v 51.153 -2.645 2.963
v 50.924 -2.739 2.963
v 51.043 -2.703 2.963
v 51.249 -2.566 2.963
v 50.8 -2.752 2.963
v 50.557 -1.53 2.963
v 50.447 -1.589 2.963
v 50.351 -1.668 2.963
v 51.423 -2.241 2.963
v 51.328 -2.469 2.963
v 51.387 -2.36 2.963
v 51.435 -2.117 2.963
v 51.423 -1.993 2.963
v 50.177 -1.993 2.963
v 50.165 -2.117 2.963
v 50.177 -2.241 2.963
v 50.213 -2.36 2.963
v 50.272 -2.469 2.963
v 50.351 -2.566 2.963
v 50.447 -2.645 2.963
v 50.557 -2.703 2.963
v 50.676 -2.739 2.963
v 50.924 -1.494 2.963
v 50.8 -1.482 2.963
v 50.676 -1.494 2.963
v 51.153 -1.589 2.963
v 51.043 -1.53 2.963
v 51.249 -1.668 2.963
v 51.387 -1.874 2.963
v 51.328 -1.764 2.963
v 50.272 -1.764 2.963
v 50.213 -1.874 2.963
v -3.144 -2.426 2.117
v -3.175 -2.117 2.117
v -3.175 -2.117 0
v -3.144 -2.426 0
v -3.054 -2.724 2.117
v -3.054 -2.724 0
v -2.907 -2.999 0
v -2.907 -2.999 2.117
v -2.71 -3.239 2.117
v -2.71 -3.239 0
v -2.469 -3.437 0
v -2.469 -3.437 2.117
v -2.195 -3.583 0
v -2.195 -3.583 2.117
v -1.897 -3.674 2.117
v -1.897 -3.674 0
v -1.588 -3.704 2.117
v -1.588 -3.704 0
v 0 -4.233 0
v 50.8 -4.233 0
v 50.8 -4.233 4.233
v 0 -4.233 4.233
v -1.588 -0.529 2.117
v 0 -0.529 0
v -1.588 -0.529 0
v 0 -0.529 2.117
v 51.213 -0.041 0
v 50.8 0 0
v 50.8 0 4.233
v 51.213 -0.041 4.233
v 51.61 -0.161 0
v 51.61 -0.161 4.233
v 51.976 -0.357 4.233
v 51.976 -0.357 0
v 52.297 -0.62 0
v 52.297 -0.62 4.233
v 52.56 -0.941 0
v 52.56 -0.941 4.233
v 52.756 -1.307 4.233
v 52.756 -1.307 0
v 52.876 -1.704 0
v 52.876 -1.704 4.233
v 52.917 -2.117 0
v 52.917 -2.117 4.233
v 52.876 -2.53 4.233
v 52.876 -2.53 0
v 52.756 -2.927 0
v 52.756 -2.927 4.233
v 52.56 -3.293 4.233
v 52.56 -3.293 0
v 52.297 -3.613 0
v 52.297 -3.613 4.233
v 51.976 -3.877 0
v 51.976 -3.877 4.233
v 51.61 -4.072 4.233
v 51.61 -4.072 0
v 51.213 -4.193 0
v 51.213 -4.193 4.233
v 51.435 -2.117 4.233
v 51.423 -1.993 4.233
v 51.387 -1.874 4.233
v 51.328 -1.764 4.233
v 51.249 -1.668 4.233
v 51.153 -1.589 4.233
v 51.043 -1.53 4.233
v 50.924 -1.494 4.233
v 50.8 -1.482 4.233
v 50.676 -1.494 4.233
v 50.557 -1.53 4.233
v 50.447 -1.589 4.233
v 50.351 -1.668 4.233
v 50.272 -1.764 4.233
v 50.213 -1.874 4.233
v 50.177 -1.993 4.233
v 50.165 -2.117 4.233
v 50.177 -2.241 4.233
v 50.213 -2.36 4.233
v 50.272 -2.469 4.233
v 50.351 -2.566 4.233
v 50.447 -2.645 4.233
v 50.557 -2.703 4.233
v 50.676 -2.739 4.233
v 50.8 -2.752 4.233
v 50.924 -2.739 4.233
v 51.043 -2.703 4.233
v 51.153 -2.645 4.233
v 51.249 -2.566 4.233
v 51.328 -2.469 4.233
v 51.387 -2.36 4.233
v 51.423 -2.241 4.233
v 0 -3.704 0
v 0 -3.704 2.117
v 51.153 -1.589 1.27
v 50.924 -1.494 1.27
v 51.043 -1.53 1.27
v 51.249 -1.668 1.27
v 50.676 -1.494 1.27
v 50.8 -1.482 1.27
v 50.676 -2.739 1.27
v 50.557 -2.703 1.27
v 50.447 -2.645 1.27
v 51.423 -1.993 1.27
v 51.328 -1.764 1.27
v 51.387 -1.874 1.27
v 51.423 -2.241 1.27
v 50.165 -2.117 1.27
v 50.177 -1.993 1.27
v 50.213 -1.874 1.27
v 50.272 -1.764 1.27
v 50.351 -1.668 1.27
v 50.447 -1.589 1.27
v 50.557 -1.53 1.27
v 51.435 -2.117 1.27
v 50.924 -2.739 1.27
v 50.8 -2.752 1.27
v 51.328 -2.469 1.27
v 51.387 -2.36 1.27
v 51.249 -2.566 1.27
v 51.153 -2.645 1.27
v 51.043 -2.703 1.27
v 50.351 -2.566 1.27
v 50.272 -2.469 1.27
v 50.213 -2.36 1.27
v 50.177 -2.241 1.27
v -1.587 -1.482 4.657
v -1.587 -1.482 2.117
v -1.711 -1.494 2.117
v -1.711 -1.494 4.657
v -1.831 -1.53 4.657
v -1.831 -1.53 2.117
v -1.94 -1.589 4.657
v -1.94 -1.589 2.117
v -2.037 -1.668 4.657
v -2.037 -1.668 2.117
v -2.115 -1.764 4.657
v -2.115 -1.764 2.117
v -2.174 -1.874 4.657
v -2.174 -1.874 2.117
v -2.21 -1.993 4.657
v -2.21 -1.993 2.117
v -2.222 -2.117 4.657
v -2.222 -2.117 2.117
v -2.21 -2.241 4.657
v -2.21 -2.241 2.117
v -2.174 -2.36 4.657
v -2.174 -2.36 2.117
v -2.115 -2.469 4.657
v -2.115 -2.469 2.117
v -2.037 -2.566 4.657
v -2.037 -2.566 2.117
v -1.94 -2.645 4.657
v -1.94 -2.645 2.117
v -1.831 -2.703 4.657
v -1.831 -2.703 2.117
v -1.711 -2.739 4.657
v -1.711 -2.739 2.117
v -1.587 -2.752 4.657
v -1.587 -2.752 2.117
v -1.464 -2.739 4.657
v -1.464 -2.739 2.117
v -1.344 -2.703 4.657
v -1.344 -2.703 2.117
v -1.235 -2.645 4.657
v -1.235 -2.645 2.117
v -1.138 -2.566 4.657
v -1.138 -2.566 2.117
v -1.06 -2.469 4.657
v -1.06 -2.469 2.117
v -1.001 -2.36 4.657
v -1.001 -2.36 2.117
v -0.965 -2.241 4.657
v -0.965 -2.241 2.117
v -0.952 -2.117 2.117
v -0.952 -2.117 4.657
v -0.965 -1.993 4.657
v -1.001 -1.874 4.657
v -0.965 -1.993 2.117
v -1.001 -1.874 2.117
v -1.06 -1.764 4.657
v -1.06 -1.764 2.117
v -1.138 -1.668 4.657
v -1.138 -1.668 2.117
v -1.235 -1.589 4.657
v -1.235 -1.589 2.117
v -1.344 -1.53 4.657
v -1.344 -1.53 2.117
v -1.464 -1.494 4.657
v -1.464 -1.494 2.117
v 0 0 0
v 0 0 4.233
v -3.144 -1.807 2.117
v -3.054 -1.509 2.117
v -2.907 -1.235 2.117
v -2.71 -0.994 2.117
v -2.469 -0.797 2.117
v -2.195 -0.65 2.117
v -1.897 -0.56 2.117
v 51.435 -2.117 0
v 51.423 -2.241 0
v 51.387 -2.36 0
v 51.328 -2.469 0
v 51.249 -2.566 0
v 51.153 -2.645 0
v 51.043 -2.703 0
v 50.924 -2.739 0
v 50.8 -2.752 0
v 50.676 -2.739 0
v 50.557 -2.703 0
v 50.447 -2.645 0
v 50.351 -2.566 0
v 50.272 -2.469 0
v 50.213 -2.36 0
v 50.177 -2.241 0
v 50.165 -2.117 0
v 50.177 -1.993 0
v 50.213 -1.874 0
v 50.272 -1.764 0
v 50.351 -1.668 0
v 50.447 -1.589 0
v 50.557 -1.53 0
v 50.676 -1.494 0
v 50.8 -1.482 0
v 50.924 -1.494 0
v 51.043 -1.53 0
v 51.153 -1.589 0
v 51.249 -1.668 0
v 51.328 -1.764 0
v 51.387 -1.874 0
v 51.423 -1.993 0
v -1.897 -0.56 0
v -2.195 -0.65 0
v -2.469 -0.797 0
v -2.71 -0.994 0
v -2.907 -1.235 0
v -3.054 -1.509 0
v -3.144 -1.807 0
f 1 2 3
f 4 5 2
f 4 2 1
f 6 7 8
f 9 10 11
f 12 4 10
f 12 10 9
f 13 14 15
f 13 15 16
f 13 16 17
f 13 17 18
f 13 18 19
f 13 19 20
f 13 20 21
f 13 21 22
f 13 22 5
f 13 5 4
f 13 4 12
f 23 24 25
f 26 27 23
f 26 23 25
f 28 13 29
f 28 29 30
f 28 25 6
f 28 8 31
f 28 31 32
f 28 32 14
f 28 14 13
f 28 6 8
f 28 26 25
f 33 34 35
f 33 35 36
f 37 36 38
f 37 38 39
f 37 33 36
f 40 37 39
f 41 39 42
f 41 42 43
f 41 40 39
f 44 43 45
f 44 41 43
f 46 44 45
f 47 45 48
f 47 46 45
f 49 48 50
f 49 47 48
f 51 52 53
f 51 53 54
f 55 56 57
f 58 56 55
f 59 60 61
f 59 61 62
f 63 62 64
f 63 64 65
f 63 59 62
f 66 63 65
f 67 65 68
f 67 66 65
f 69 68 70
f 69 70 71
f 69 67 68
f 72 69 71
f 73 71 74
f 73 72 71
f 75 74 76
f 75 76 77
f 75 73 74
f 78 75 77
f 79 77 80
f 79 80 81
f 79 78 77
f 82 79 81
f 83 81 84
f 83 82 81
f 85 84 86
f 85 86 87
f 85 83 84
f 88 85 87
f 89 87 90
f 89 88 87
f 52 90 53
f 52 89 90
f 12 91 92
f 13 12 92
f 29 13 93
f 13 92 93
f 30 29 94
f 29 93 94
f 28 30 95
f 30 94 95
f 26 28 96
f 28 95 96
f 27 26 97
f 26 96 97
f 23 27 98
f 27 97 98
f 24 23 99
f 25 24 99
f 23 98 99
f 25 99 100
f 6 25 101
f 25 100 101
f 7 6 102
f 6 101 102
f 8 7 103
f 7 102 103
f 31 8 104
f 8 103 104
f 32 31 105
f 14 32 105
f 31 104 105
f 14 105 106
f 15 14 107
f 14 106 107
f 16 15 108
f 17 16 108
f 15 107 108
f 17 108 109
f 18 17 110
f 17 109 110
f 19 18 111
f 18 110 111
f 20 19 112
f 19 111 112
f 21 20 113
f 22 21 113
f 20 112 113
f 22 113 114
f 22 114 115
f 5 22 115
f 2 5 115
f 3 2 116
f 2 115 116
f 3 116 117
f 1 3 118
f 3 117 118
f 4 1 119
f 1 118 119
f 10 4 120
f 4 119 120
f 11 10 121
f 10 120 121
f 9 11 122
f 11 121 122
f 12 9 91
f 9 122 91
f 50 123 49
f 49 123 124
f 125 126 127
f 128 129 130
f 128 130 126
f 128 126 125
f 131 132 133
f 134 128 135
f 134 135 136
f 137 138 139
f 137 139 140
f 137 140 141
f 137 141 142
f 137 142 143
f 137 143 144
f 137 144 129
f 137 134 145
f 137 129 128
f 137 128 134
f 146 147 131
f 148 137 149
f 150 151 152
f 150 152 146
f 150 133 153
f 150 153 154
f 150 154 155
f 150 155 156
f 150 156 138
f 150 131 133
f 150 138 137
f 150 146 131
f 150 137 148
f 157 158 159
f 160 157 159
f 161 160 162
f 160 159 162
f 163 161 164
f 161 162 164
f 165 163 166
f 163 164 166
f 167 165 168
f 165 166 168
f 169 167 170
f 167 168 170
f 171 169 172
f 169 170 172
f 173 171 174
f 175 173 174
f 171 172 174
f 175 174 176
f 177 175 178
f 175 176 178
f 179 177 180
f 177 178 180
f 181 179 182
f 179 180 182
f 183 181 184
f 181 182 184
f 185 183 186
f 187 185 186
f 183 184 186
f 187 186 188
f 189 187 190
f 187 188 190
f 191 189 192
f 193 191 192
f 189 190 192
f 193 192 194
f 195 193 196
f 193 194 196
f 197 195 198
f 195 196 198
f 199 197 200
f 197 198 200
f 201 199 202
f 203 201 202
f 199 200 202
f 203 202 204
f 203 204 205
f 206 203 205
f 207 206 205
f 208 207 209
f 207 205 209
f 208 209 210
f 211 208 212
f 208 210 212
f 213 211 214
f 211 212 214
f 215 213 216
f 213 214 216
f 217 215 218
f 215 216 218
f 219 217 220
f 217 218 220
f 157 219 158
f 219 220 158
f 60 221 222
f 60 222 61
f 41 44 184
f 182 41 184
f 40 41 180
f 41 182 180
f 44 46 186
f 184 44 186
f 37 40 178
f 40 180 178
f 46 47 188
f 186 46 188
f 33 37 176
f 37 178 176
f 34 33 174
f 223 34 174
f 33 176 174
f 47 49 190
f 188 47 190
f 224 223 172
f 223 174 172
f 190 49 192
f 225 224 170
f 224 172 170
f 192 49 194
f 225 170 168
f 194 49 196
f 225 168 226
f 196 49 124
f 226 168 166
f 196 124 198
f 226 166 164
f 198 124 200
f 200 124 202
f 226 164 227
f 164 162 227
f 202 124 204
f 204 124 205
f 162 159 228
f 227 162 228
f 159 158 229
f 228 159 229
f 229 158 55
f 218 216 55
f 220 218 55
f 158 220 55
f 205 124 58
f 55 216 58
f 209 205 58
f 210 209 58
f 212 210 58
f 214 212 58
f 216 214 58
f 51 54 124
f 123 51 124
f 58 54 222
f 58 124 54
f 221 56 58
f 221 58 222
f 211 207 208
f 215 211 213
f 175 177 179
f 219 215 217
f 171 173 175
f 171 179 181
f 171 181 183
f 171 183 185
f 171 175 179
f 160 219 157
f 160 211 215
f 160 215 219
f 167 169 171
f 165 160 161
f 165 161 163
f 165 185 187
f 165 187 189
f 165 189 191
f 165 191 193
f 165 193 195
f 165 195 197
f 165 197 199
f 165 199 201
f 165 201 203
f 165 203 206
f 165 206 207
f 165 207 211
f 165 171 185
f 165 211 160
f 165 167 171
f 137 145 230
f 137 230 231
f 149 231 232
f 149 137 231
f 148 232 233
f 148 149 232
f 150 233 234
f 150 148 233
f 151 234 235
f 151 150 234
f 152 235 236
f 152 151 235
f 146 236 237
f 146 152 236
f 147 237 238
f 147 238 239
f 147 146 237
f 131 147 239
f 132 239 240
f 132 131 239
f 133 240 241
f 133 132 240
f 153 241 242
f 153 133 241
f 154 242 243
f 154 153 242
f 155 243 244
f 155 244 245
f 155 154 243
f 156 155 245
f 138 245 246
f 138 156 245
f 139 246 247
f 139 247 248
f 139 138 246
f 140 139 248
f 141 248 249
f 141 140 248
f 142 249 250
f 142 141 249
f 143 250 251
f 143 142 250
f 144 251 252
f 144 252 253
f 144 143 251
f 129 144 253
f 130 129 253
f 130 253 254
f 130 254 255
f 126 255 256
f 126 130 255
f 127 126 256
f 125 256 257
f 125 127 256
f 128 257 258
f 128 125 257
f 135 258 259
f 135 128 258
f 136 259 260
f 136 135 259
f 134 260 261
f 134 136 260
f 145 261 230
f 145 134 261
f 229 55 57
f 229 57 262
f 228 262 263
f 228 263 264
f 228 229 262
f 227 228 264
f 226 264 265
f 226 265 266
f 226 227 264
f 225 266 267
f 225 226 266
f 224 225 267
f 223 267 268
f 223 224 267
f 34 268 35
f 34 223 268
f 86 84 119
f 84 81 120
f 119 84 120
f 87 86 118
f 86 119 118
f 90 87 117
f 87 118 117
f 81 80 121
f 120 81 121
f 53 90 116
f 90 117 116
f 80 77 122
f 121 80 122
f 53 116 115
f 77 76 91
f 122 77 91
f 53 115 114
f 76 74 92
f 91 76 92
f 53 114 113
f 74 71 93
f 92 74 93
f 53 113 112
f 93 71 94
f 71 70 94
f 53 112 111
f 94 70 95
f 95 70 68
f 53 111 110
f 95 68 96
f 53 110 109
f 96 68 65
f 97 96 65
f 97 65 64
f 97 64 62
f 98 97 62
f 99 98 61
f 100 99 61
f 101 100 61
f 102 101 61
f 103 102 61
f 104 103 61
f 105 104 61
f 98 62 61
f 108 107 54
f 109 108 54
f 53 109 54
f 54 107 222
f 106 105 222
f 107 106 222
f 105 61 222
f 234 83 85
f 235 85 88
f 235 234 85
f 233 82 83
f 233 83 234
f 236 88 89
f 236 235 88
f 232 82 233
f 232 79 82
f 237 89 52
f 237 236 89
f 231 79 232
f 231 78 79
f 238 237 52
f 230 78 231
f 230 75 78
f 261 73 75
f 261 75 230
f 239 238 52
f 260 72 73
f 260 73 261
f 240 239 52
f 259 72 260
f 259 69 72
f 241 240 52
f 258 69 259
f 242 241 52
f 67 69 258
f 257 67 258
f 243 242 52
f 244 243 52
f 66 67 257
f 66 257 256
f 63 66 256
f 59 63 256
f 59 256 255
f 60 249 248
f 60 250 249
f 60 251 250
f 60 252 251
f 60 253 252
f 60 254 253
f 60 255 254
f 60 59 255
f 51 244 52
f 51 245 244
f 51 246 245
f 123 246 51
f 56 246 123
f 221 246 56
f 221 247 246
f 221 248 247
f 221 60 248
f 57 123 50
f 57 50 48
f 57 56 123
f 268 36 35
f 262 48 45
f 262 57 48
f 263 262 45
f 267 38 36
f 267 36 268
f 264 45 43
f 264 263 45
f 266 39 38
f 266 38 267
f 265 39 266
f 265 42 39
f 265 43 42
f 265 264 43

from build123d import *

# Parameters (mm, degrees)
BOSS_EXTRUDE3_DEPTH = 4.233333333
SKETCH4_W           = 2.116666667
SKETCH4_H           = 3.175
BOSS_EXTRUDE5_DEPTH = 3.175
CUT_EXTRUDE1_START  = -2.116666667
CUT_EXTRUDE1_DEPTH  = 2.116666667
SKETCH6_R           = 0.635
BOSS_EXTRUDE6_DEPTH = 2.54
SKETCH7_R           = 0.635
CUT_EXTRUDE2_DEPTH  = 1.27
CUT_EXTRUDE3_START  = -1.27
SKETCH8_R           = 0.635
CUT_EXTRUDE3_DEPTH  = 1.27


# Read off the part's stored shape, not the designer's step: Cut-Extrude1
with BuildPart() as part:
    # Sketch3 → Boss-Extrude3 (new body)
    with BuildSketch(Plane.XY):
        with BuildLine():
            Line((0, 0), (50.8, 0))
            ThreePointArc((50.8, 0), (52.916666667, -2.116666667), (50.8, -4.233333333))
            Line((50.8, -4.233333333), (0, -4.233333333))
            Line((0, -4.233333333), (0, 0))
        make_face()
    extrude(amount=BOSS_EXTRUDE3_DEPTH)

    # Sketch4 → Boss-Extrude5 (add)
    with BuildSketch(Plane.ZY):
        with Locations((1.058333334, -2.116666667)):
            Rectangle(SKETCH4_W, SKETCH4_H)
    extrude(amount=BOSS_EXTRUDE5_DEPTH)

    # Cut-Extrude1 outline → Cut-Extrude1 (cut)
    with BuildSketch(Plane(origin=(0, 0, 0), x_dir=(-1, 0, 0), z_dir=(0, 0, -1)).offset(CUT_EXTRUDE1_START)):
        with BuildLine():
            Line((3.175, -0.529166667), (1.5875, -0.529166667))
            ThreePointArc((1.5875, -0.529166667), (2.710032015, -0.994134652), (3.175, -2.116666667))
            Line((3.175, -2.116666667), (3.175, -0.529166667))
        make_face()
        with BuildLine():
            Line((3.175, -3.704166667), (3.175, -2.116666667))
            ThreePointArc((3.175, -2.116666667), (2.710032015, -3.239198682), (1.5875, -3.704166667))
            Line((1.5875, -3.704166667), (3.175, -3.704166667))
        make_face()
    extrude(amount=CUT_EXTRUDE1_DEPTH, mode=Mode.SUBTRACT)

    # Sketch6 → Boss-Extrude6 (add)
    with BuildSketch(Plane.XY.offset(2.116666667)):
        with Locations(Location((-1.5875, -2.116666667, 0), (0, 0, 90))):
            Circle(SKETCH6_R)
    extrude(amount=BOSS_EXTRUDE6_DEPTH)

    # Sketch7 → Cut-Extrude2 (cut)
    with BuildSketch(Plane.XY.offset(4.233333333)):
        with Locations((50.8, -2.116666667)):
            Circle(SKETCH7_R)
    extrude(amount=-CUT_EXTRUDE2_DEPTH, mode=Mode.SUBTRACT)

    # Sketch8 → Cut-Extrude3 (cut)
    with BuildSketch(Plane(origin=(0, 0, 0), x_dir=(-1, 0, 0), z_dir=(0, 0, -1)).offset(CUT_EXTRUDE3_START)):
        with Locations(Location((-50.8, -2.116666667, 0), (0, 0, 180))):
            Circle(SKETCH8_R)
    extrude(amount=CUT_EXTRUDE3_DEPTH, mode=Mode.SUBTRACT)


solid = part.part
